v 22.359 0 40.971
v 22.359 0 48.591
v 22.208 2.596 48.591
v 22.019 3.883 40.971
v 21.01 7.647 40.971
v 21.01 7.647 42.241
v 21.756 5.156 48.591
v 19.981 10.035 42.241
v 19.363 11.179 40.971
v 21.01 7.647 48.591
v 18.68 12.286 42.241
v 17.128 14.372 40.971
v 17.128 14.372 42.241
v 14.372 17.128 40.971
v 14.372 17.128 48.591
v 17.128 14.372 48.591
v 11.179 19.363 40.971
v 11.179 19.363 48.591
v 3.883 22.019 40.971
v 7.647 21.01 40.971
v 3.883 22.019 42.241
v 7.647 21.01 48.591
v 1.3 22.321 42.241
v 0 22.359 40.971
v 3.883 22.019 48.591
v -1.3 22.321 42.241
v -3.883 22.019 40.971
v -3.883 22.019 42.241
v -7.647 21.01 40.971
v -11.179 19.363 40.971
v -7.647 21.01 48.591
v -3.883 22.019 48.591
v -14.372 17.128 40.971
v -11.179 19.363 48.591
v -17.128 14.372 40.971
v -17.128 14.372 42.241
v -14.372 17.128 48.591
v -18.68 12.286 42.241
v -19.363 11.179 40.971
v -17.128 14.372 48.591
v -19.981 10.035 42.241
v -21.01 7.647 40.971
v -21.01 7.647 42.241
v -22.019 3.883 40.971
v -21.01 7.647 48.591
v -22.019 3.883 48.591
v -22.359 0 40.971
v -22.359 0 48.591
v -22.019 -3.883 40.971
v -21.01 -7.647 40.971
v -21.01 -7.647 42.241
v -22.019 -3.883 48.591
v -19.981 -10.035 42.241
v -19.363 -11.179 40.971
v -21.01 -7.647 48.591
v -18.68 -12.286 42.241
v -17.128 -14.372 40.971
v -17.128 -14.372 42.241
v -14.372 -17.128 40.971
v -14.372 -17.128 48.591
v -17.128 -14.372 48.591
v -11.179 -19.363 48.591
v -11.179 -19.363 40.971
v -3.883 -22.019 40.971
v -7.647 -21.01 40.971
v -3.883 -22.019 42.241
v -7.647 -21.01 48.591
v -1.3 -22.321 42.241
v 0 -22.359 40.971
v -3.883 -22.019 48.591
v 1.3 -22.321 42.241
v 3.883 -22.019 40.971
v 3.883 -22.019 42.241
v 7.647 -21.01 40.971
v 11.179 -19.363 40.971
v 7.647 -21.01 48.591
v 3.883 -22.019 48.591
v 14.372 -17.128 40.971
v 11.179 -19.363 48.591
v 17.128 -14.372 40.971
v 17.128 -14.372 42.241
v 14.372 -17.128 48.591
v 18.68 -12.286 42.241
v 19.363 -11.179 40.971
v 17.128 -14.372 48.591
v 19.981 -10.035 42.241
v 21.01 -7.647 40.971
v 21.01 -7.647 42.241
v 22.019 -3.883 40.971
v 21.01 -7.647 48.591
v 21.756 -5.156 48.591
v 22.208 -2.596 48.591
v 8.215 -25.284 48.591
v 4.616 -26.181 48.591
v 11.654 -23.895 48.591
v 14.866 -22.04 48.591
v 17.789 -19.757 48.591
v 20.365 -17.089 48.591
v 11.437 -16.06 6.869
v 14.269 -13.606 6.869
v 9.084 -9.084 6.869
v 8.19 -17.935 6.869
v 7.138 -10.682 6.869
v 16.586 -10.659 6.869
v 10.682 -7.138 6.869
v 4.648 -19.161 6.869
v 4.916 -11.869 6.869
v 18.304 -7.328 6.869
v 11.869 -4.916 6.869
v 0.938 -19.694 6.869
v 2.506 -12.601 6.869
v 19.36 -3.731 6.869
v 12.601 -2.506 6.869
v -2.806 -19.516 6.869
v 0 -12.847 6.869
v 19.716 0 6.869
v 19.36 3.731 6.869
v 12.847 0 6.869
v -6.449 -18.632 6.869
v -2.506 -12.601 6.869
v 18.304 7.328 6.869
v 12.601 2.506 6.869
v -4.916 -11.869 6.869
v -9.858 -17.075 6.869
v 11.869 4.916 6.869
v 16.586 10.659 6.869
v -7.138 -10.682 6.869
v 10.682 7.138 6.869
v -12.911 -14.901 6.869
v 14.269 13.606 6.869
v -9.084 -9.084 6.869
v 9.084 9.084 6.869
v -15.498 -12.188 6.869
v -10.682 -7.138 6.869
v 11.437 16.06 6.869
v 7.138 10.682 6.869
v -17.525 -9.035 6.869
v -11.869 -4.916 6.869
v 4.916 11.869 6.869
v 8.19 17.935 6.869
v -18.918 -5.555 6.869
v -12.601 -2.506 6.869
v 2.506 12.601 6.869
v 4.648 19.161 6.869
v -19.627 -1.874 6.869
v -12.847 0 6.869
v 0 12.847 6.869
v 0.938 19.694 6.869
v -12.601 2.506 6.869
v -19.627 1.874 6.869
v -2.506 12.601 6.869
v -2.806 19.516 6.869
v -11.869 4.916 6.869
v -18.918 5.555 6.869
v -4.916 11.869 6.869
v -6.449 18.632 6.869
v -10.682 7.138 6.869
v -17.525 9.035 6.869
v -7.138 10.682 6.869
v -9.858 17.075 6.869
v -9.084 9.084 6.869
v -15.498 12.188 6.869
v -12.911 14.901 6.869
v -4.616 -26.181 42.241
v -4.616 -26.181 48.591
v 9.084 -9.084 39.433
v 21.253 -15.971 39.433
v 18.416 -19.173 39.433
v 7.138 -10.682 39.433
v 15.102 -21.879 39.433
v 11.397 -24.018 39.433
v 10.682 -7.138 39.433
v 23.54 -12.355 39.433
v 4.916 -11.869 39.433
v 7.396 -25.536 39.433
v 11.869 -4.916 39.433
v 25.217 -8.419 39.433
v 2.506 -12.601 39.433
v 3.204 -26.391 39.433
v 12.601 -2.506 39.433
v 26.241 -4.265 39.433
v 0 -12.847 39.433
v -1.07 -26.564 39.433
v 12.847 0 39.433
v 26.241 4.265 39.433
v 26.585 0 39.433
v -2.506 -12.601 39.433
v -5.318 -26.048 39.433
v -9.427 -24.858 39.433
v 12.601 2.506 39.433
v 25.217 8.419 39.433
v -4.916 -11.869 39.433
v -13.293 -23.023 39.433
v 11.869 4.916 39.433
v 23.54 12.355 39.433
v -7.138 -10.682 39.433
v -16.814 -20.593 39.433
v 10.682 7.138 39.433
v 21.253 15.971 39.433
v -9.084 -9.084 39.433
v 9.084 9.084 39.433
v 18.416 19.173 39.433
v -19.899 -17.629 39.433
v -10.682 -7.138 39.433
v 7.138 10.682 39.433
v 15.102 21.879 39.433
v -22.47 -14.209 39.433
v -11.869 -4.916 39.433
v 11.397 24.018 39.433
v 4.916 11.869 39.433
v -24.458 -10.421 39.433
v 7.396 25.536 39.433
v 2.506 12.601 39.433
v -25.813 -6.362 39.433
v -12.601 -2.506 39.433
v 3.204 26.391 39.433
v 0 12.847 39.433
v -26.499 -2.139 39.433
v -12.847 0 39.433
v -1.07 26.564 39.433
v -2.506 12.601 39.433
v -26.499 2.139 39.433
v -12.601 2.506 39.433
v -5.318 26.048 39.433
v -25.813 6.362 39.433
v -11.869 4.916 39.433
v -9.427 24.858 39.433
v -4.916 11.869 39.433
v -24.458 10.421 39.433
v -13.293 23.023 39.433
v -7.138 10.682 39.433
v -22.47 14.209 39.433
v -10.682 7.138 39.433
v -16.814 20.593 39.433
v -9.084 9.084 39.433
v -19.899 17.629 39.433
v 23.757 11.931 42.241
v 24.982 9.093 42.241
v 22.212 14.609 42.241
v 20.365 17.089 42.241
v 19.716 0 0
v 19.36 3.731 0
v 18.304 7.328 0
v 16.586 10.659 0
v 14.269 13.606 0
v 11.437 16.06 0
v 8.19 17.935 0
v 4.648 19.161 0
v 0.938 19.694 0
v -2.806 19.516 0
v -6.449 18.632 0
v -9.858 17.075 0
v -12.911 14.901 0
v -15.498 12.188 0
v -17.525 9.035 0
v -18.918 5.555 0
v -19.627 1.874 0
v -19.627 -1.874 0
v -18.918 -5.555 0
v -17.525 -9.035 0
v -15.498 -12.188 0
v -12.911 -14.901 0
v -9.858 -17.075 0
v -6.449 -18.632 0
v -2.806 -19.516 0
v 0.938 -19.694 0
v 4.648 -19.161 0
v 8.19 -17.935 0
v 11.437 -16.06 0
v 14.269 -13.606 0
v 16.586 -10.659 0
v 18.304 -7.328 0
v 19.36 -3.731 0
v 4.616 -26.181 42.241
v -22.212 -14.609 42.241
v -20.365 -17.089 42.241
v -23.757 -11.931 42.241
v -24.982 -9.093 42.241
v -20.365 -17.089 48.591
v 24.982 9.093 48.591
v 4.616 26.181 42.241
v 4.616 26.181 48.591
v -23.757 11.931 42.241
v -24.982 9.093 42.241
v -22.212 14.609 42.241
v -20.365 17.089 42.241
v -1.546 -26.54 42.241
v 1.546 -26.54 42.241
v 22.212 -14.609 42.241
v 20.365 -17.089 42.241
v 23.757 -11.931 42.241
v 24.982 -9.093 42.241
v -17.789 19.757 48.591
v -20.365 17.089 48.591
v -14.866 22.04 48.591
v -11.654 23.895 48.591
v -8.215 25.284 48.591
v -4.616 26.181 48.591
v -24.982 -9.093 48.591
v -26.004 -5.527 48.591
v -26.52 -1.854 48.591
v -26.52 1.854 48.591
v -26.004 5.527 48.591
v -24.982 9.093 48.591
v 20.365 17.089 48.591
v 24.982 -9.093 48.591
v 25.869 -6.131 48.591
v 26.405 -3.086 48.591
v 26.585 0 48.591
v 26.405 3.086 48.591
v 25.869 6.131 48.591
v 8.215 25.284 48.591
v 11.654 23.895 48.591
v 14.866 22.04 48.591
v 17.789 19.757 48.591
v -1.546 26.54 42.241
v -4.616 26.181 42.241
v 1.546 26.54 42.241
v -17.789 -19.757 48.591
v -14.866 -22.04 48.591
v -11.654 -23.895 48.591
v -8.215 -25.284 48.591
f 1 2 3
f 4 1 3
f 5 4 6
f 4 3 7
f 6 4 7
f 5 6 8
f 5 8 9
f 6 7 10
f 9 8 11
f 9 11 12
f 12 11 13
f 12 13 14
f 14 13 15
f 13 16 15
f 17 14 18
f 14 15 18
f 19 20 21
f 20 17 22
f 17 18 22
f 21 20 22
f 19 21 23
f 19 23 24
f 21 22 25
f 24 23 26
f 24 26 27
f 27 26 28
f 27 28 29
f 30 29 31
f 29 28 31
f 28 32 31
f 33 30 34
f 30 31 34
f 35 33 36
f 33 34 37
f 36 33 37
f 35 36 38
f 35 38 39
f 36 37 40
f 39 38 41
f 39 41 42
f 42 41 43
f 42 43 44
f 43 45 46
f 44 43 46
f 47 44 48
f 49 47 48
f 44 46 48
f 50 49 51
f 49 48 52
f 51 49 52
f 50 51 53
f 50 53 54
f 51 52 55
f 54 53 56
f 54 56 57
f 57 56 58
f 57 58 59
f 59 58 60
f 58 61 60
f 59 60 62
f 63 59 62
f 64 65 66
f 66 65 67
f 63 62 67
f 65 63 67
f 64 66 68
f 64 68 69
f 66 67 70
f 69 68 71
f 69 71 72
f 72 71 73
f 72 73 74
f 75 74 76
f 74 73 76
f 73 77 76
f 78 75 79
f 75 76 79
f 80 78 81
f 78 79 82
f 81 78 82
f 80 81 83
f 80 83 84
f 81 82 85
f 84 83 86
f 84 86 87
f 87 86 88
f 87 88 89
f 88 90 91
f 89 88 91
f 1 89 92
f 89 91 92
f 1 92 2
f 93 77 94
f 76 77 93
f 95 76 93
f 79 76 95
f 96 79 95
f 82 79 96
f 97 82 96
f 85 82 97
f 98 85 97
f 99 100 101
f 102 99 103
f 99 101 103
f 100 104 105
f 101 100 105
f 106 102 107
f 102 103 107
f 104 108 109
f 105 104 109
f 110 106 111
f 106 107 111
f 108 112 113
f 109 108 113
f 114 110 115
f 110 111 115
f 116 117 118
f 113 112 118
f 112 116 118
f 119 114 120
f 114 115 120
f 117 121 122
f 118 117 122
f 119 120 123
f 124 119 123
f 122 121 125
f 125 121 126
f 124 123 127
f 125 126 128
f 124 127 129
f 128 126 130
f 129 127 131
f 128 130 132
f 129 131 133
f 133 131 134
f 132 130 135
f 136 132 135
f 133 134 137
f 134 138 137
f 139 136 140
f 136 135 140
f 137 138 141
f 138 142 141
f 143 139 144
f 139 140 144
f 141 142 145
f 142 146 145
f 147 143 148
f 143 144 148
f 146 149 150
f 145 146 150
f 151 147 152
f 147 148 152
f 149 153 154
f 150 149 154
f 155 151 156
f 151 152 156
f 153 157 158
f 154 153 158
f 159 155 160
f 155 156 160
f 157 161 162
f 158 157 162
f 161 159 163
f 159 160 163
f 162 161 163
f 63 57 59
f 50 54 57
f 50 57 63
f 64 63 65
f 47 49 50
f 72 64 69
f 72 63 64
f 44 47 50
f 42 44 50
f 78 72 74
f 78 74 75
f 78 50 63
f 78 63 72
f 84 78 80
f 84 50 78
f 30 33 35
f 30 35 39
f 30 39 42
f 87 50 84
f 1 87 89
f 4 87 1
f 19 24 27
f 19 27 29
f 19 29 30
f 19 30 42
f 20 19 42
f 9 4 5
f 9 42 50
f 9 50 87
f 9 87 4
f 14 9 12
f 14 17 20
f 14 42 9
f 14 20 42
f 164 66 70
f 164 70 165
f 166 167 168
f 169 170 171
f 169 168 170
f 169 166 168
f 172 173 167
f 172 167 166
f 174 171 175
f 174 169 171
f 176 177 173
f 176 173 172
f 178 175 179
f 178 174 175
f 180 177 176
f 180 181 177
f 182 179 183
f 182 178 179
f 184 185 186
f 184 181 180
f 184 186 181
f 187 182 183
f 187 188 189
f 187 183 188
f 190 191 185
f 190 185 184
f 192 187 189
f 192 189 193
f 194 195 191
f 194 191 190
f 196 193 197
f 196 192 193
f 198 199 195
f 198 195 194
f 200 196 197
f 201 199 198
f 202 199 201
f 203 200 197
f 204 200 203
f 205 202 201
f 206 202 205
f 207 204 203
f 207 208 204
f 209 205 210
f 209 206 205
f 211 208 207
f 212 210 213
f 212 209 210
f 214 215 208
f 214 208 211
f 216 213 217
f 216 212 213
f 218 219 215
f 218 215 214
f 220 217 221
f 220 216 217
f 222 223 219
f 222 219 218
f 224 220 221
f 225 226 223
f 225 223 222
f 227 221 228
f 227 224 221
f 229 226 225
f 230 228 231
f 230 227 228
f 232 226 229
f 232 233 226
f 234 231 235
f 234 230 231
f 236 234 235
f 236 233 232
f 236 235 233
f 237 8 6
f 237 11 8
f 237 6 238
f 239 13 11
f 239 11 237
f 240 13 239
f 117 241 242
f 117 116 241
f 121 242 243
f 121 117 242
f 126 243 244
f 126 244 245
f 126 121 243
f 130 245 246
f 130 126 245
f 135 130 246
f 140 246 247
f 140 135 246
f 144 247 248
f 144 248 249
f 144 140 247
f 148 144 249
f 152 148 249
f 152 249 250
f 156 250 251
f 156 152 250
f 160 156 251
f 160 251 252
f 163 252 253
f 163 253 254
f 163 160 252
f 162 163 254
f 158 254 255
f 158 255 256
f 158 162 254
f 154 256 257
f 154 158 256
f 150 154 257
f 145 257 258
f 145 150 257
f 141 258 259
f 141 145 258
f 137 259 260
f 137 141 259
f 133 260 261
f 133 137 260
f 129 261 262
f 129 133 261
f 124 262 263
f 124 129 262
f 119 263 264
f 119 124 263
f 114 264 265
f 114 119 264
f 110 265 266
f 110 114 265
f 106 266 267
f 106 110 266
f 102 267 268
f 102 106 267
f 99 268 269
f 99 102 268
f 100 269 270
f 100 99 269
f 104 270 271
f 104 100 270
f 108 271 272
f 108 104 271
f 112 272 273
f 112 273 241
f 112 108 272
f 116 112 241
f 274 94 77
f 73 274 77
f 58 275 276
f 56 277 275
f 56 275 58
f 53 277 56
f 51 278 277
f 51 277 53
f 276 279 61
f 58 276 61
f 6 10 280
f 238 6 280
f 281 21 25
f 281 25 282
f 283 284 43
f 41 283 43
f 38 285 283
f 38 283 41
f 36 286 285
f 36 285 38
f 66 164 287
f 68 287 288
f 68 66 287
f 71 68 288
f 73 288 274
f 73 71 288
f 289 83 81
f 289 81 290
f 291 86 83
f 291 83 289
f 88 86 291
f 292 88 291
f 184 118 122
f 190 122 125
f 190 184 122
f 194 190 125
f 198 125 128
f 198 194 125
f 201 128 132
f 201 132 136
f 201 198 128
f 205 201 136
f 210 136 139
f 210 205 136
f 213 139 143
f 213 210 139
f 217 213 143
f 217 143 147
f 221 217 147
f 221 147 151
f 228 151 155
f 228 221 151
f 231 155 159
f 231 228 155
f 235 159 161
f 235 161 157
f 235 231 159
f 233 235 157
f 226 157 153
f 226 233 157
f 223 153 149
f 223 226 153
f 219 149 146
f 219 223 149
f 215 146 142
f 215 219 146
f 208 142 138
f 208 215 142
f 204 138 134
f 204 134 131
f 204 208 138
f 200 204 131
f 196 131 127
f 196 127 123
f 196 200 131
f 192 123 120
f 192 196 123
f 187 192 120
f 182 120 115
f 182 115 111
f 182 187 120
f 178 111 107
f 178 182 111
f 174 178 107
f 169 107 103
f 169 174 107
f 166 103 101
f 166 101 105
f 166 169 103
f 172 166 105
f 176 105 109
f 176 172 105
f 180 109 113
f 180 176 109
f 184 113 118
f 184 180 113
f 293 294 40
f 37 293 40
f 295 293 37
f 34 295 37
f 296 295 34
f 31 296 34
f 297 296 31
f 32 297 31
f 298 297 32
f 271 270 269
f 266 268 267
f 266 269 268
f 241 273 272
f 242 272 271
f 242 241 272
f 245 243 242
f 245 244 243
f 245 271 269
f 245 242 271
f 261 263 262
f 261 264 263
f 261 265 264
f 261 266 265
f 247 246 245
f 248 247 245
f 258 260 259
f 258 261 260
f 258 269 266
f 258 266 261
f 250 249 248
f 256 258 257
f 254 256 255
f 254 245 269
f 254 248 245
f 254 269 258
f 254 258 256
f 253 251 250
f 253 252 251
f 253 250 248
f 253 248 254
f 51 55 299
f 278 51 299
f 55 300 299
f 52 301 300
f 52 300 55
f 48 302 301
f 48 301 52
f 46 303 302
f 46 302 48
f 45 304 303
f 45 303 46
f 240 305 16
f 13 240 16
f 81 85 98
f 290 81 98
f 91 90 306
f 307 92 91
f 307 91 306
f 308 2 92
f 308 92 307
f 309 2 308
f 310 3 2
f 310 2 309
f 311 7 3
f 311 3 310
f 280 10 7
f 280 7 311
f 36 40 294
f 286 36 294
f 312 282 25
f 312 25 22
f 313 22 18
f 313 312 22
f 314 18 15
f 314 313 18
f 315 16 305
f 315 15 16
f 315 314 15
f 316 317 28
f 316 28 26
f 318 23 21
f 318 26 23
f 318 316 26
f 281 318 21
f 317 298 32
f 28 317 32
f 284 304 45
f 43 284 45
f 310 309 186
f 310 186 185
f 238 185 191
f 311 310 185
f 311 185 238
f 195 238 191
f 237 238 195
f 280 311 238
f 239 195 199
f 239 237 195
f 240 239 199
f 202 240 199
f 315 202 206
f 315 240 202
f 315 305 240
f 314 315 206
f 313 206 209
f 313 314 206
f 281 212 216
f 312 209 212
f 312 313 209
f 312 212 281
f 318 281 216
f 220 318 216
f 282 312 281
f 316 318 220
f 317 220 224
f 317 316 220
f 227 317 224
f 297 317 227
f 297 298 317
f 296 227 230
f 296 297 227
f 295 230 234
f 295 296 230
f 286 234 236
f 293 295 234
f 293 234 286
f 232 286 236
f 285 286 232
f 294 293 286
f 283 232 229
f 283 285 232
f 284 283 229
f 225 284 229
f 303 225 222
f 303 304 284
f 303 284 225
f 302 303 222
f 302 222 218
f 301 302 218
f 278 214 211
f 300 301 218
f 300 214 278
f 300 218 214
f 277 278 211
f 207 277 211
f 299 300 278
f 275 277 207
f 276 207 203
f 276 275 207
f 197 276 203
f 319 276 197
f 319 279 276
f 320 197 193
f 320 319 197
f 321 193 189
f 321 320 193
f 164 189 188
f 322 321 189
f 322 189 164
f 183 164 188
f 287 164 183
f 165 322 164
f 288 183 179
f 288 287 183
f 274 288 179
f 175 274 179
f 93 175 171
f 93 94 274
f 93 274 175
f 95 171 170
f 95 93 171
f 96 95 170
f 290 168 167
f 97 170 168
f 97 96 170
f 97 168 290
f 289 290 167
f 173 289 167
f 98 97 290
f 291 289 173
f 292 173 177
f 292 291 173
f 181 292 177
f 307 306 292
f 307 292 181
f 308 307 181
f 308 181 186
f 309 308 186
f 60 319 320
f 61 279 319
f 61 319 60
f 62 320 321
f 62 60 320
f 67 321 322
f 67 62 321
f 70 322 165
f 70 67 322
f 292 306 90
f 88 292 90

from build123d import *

# Parameters (mm, degrees)
F0_W     = 6.8689025939
F0_H     = 6.8689035252
F0_W_2   = 12.8473937511
F0_H_2   = 32.5636891648
F2_R     = 22.3587464381
F3_DEPTH = 7.62
F5_DEPTH = 6.35


with BuildPart() as f1:
    # F0 (on Front) → F1 (revolve)
    with BuildSketch(Plane.XZ):
        Polygon((0, 48.5911294818), (0, 39.43259269), (12.8473937511, 39.43259269), (26.5851970762, 39.43259269), (26.5851970762, 48.5911294818), align=None)
        with Locations((16.2818450481, 3.4344517626)):
            Rectangle(F0_W, F0_H)
        with Locations((6.4236968756, 23.1507481076)):
            Rectangle(F0_W_2, F0_H_2)
        with Locations((6.4236968756, 3.4344517626)):
            Rectangle(F0_W_2, F0_H)
    revolve(axis=Axis((0, 0, 19.716296345), (0, 0, 1)))

    # F2 (on face) → F3 (cut)
    with BuildSketch(Plane.XY.offset(48.5911294818)):
        Circle(F2_R)
    extrude(amount=-F3_DEPTH, mode=Mode.SUBTRACT)

    # F4 (on face) → F5 (cut)
    with BuildSketch(Plane.XY.offset(48.5911294818)):
        with BuildLine():
            ThreePointArc((-3.0514306297, 17.3055230542), (0, 17.5724886419), (3.0514306297, 17.3055230542))
            Line((3.0514306297, 17.3055230542), (5.4403788798, 30.8539218326))
            ThreePointArc((5.4403788798, 30.8539218326), (0, 31.3298933099), (-5.4403788798, 30.8539218326))
            Line((-5.4403788798, 30.8539218326), (-3.0514306297, 17.3055230542))
        make_face()
        with BuildLine():
            ThreePointArc((-16.5127379056, 6.0101450839), (-15.2182215716, 8.7862443209), (-13.4613072759, 11.2953779703))
            Line((-13.4613072759, 11.2953779703), (-24.0000906736, 20.1384672324))
            ThreePointArc((-24.0000906736, 20.1384672324), (-27.1324835042, 15.664946655), (-29.4404695533, 10.7154546002))
            Line((-29.4404695533, 10.7154546002), (-16.5127379056, 6.0101450839))
        make_face()
        with BuildLine():
            ThreePointArc((-13.4613072759, -11.2953779703), (-15.2182215716, -8.7862443209), (-16.5127379056, -6.0101450839))
            Line((-16.5127379056, -6.0101450839), (-29.4404695533, -10.7154546002))
            ThreePointArc((-29.4404695533, -10.7154546002), (-27.1324835042, -15.664946655), (-24.0000906736, -20.1384672324))
            Line((-24.0000906736, -20.1384672324), (-13.4613072759, -11.2953779703))
        make_face()
        with BuildLine():
            ThreePointArc((3.0514306297, -17.3055230542), (0, -17.5724886419), (-3.0514306297, -17.3055230542))
            Line((-3.0514306297, -17.3055230542), (-5.4403788798, -30.8539218326))
            ThreePointArc((-5.4403788798, -30.8539218326), (0, -31.3298933099), (5.4403788798, -30.8539218326))
            Line((5.4403788798, -30.8539218326), (3.0514306297, -17.3055230542))
        make_face()
        with BuildLine():
            ThreePointArc((16.5127379056, -6.0101450839), (15.2182215716, -8.7862443209), (13.4613072759, -11.2953779703))
            Line((13.4613072759, -11.2953779703), (24.0000906736, -20.1384672324))
            ThreePointArc((24.0000906736, -20.1384672324), (27.1324835042, -15.664946655), (29.4404695533, -10.7154546002))
            Line((29.4404695533, -10.7154546002), (16.5127379056, -6.0101450839))
        make_face()
        with BuildLine():
            ThreePointArc((13.4613072759, 11.2953779703), (15.2182215716, 8.7862443209), (16.5127379056, 6.0101450839))
            Line((16.5127379056, 6.0101450839), (29.4404695533, 10.7154546002))
            ThreePointArc((29.4404695533, 10.7154546002), (27.1324835042, 15.664946655), (24.0000906736, 20.1384672324))
            Line((24.0000906736, 20.1384672324), (13.4613072759, 11.2953779703))
        make_face()
    extrude(amount=-F5_DEPTH, mode=Mode.SUBTRACT)


solid = f1.part
